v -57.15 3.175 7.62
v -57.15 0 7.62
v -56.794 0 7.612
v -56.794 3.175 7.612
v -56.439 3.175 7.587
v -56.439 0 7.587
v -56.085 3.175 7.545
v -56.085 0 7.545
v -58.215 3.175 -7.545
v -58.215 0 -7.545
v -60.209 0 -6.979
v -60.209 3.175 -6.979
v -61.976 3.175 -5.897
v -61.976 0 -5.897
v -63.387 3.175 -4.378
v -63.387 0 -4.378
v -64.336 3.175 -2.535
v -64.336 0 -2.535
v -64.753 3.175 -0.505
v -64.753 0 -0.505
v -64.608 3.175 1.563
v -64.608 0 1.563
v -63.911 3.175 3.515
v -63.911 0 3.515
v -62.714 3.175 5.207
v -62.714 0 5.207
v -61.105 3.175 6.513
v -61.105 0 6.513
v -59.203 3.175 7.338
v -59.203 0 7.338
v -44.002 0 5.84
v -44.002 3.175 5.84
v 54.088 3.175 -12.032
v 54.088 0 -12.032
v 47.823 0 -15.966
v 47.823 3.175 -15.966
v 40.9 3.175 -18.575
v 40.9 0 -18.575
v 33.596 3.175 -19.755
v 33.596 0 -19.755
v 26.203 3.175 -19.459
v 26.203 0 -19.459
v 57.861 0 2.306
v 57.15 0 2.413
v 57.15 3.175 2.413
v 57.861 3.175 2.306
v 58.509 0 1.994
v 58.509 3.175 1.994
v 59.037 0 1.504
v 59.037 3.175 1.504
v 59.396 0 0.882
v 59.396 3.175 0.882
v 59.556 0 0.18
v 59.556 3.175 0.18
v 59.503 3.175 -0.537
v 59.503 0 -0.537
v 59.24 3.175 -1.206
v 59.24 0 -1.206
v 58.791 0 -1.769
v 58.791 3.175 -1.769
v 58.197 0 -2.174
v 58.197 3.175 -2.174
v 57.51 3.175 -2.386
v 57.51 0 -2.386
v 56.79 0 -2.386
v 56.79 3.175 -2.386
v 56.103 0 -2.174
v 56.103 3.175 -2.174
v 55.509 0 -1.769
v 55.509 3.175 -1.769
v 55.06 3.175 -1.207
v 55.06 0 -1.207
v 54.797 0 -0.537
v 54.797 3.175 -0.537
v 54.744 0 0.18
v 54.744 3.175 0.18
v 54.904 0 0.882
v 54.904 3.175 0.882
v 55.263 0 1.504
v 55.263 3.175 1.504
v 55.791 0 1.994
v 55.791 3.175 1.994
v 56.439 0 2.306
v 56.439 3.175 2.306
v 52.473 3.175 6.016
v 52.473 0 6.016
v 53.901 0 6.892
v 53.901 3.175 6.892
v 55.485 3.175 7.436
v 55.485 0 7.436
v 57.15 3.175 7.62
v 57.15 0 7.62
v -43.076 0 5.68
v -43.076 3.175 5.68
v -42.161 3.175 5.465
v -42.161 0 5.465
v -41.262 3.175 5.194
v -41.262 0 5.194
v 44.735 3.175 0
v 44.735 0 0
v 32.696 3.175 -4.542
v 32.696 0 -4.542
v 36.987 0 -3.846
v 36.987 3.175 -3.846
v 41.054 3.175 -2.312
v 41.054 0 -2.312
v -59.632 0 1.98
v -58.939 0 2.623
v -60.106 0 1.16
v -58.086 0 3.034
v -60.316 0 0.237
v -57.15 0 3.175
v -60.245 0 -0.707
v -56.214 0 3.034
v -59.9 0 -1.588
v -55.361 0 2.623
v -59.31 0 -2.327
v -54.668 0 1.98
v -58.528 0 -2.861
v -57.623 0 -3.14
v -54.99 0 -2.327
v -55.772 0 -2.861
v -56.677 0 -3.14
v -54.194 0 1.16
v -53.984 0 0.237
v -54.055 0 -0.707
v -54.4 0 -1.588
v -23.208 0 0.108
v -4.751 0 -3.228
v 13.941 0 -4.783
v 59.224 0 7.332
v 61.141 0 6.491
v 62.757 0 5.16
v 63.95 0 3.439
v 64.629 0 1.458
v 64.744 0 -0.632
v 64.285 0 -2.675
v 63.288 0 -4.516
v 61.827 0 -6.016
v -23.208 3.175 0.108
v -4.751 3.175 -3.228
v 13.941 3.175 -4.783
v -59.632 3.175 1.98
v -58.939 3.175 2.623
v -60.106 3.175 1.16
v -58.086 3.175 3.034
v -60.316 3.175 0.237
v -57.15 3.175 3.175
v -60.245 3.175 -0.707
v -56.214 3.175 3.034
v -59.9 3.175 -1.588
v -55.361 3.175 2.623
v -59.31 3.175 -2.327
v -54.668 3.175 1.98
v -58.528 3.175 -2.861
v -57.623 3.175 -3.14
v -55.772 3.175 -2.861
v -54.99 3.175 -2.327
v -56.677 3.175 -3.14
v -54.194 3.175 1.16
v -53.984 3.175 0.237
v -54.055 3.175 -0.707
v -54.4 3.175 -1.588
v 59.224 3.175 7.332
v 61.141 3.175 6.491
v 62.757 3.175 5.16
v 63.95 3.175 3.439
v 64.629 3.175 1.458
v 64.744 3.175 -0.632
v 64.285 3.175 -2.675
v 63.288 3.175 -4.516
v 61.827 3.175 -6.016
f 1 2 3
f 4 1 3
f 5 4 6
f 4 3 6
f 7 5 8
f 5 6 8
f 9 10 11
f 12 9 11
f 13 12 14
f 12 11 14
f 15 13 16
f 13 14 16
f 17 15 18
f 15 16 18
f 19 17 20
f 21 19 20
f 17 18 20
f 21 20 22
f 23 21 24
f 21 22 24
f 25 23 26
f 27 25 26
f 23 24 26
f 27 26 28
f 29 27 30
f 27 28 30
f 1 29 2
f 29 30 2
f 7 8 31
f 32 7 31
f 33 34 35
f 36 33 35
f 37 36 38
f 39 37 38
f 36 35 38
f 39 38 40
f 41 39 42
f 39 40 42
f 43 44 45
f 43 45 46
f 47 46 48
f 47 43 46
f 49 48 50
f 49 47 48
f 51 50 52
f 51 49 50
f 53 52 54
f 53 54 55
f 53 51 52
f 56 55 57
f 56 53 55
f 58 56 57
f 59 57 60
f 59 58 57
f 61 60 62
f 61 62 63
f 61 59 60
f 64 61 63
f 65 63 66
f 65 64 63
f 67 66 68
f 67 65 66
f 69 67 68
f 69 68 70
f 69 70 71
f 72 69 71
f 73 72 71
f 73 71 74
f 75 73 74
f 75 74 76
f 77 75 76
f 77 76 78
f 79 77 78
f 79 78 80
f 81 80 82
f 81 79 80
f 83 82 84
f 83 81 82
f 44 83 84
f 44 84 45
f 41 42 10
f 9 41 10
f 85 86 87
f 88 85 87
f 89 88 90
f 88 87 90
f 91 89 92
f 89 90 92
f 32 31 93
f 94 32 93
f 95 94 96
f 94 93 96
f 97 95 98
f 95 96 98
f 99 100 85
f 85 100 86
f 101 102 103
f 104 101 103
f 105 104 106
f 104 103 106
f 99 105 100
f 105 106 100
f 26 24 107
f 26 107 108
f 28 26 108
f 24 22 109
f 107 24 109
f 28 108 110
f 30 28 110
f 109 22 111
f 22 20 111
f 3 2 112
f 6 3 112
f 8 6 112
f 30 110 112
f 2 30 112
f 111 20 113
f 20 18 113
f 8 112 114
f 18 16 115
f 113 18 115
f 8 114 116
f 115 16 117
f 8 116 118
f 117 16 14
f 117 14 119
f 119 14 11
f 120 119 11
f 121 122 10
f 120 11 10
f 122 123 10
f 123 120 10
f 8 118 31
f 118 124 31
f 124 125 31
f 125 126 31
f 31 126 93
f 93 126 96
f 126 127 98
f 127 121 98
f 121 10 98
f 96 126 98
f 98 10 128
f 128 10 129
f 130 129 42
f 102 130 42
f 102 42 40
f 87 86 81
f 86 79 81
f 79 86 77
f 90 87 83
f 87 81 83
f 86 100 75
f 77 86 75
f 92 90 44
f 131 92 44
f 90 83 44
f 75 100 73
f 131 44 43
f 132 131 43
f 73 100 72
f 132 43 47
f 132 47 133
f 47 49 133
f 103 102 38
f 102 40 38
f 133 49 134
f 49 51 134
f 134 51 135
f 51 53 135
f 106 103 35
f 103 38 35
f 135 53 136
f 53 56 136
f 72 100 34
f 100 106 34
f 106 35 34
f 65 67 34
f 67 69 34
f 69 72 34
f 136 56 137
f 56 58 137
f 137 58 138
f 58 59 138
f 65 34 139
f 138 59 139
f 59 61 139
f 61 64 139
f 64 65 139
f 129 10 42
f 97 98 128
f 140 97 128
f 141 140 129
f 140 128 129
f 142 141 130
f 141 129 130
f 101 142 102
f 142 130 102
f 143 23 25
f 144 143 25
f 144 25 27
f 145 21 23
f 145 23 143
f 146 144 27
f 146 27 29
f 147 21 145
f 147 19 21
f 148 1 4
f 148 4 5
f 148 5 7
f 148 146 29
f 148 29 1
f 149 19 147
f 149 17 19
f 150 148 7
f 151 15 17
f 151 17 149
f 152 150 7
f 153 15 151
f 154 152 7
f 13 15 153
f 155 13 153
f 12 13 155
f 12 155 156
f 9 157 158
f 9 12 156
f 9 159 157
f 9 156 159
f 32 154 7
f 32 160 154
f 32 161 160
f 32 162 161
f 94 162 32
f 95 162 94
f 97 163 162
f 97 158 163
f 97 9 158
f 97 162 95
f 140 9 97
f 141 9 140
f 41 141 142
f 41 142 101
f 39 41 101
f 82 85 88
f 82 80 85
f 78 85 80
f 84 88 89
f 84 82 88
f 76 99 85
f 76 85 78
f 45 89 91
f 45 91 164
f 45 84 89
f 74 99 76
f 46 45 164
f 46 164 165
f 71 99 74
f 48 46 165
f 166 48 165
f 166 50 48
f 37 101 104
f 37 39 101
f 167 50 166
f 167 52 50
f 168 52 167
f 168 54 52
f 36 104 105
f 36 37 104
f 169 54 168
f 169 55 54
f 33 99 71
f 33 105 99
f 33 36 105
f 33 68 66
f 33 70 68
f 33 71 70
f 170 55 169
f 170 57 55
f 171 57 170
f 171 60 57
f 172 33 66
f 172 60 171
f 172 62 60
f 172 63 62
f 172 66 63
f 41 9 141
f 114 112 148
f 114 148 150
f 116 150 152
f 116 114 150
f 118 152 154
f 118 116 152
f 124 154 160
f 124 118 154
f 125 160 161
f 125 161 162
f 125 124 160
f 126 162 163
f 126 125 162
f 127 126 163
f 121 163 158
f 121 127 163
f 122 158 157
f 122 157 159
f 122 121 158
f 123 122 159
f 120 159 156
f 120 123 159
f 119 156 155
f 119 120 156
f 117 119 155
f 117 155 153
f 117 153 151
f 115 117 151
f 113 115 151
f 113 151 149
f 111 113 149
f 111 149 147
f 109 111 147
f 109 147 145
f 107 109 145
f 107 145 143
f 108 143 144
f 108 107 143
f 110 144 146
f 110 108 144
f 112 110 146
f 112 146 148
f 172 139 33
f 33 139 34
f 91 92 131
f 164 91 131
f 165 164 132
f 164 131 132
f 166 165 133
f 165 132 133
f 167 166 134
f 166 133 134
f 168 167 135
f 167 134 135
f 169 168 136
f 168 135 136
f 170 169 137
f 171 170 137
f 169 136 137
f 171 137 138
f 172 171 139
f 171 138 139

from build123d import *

# Parameters (mm, degrees)
SKETCH2_R           = 3.175
SKETCH2_R_2         = 2.413
BOSS_EXTRUDE2_DEPTH = 3.175


with BuildPart() as part:
    # Sketch2 → Boss-Extrude2 (new body)
    with BuildSketch(Plane(origin=(0, 0, 0), x_dir=(1, 0, 0), z_dir=(0, 1, 0))):
        with BuildLine():
            ThreePointArc((-57.15, -7.62), (-56.616270879, -7.601284972), (-56.085163479, -7.545231818))
            Line((-56.085163479, -7.545231818), (-44.001957312, -5.839964235))
            ThreePointArc((-44.001957312, -5.839964235), (-42.617088962, -5.579674967), (-41.261668847, -5.194386554))
            ThreePointArc((-41.261668847, -5.194386554), (-4.750522579, 3.228025881), (32.696434157, 4.541899627))
            ThreePointArc((32.696434157, 4.541899627), (39.058772614, 3.180733721), (44.734603501, 0))
            Line((44.734603501, 0), (52.473194068, -6.015969271))
            ThreePointArc((52.473194068, -6.015969271), (54.677884089, -7.207845928), (57.15, -7.62))
            ThreePointArc((57.15, -7.62), (64.357845928, -2.472115911), (61.826805932, 6.015969271))
            Line((61.826805932, 6.015969271), (54.088215365, 12.031938542))
            ThreePointArc((54.088215365, 12.031938542), (40.899560171, 18.575357931), (26.203429573, 19.458935064))
            Line((26.203429573, 19.458935064), (-58.214836521, 7.545231818))
            ThreePointArc((-58.214836521, 7.545231818), (-64.751284972, -0.533729121), (-57.15, -7.62))
        make_face()
        with Locations(Location((-57.15, 0, 0), (0, 0, 270))):
            Circle(SKETCH2_R, mode=Mode.SUBTRACT)
        with Locations(Location((57.15, 0, 0), (0, 0, 270))):
            Circle(SKETCH2_R_2, mode=Mode.SUBTRACT)
    extrude(amount=BOSS_EXTRUDE2_DEPTH)


solid = part.part
